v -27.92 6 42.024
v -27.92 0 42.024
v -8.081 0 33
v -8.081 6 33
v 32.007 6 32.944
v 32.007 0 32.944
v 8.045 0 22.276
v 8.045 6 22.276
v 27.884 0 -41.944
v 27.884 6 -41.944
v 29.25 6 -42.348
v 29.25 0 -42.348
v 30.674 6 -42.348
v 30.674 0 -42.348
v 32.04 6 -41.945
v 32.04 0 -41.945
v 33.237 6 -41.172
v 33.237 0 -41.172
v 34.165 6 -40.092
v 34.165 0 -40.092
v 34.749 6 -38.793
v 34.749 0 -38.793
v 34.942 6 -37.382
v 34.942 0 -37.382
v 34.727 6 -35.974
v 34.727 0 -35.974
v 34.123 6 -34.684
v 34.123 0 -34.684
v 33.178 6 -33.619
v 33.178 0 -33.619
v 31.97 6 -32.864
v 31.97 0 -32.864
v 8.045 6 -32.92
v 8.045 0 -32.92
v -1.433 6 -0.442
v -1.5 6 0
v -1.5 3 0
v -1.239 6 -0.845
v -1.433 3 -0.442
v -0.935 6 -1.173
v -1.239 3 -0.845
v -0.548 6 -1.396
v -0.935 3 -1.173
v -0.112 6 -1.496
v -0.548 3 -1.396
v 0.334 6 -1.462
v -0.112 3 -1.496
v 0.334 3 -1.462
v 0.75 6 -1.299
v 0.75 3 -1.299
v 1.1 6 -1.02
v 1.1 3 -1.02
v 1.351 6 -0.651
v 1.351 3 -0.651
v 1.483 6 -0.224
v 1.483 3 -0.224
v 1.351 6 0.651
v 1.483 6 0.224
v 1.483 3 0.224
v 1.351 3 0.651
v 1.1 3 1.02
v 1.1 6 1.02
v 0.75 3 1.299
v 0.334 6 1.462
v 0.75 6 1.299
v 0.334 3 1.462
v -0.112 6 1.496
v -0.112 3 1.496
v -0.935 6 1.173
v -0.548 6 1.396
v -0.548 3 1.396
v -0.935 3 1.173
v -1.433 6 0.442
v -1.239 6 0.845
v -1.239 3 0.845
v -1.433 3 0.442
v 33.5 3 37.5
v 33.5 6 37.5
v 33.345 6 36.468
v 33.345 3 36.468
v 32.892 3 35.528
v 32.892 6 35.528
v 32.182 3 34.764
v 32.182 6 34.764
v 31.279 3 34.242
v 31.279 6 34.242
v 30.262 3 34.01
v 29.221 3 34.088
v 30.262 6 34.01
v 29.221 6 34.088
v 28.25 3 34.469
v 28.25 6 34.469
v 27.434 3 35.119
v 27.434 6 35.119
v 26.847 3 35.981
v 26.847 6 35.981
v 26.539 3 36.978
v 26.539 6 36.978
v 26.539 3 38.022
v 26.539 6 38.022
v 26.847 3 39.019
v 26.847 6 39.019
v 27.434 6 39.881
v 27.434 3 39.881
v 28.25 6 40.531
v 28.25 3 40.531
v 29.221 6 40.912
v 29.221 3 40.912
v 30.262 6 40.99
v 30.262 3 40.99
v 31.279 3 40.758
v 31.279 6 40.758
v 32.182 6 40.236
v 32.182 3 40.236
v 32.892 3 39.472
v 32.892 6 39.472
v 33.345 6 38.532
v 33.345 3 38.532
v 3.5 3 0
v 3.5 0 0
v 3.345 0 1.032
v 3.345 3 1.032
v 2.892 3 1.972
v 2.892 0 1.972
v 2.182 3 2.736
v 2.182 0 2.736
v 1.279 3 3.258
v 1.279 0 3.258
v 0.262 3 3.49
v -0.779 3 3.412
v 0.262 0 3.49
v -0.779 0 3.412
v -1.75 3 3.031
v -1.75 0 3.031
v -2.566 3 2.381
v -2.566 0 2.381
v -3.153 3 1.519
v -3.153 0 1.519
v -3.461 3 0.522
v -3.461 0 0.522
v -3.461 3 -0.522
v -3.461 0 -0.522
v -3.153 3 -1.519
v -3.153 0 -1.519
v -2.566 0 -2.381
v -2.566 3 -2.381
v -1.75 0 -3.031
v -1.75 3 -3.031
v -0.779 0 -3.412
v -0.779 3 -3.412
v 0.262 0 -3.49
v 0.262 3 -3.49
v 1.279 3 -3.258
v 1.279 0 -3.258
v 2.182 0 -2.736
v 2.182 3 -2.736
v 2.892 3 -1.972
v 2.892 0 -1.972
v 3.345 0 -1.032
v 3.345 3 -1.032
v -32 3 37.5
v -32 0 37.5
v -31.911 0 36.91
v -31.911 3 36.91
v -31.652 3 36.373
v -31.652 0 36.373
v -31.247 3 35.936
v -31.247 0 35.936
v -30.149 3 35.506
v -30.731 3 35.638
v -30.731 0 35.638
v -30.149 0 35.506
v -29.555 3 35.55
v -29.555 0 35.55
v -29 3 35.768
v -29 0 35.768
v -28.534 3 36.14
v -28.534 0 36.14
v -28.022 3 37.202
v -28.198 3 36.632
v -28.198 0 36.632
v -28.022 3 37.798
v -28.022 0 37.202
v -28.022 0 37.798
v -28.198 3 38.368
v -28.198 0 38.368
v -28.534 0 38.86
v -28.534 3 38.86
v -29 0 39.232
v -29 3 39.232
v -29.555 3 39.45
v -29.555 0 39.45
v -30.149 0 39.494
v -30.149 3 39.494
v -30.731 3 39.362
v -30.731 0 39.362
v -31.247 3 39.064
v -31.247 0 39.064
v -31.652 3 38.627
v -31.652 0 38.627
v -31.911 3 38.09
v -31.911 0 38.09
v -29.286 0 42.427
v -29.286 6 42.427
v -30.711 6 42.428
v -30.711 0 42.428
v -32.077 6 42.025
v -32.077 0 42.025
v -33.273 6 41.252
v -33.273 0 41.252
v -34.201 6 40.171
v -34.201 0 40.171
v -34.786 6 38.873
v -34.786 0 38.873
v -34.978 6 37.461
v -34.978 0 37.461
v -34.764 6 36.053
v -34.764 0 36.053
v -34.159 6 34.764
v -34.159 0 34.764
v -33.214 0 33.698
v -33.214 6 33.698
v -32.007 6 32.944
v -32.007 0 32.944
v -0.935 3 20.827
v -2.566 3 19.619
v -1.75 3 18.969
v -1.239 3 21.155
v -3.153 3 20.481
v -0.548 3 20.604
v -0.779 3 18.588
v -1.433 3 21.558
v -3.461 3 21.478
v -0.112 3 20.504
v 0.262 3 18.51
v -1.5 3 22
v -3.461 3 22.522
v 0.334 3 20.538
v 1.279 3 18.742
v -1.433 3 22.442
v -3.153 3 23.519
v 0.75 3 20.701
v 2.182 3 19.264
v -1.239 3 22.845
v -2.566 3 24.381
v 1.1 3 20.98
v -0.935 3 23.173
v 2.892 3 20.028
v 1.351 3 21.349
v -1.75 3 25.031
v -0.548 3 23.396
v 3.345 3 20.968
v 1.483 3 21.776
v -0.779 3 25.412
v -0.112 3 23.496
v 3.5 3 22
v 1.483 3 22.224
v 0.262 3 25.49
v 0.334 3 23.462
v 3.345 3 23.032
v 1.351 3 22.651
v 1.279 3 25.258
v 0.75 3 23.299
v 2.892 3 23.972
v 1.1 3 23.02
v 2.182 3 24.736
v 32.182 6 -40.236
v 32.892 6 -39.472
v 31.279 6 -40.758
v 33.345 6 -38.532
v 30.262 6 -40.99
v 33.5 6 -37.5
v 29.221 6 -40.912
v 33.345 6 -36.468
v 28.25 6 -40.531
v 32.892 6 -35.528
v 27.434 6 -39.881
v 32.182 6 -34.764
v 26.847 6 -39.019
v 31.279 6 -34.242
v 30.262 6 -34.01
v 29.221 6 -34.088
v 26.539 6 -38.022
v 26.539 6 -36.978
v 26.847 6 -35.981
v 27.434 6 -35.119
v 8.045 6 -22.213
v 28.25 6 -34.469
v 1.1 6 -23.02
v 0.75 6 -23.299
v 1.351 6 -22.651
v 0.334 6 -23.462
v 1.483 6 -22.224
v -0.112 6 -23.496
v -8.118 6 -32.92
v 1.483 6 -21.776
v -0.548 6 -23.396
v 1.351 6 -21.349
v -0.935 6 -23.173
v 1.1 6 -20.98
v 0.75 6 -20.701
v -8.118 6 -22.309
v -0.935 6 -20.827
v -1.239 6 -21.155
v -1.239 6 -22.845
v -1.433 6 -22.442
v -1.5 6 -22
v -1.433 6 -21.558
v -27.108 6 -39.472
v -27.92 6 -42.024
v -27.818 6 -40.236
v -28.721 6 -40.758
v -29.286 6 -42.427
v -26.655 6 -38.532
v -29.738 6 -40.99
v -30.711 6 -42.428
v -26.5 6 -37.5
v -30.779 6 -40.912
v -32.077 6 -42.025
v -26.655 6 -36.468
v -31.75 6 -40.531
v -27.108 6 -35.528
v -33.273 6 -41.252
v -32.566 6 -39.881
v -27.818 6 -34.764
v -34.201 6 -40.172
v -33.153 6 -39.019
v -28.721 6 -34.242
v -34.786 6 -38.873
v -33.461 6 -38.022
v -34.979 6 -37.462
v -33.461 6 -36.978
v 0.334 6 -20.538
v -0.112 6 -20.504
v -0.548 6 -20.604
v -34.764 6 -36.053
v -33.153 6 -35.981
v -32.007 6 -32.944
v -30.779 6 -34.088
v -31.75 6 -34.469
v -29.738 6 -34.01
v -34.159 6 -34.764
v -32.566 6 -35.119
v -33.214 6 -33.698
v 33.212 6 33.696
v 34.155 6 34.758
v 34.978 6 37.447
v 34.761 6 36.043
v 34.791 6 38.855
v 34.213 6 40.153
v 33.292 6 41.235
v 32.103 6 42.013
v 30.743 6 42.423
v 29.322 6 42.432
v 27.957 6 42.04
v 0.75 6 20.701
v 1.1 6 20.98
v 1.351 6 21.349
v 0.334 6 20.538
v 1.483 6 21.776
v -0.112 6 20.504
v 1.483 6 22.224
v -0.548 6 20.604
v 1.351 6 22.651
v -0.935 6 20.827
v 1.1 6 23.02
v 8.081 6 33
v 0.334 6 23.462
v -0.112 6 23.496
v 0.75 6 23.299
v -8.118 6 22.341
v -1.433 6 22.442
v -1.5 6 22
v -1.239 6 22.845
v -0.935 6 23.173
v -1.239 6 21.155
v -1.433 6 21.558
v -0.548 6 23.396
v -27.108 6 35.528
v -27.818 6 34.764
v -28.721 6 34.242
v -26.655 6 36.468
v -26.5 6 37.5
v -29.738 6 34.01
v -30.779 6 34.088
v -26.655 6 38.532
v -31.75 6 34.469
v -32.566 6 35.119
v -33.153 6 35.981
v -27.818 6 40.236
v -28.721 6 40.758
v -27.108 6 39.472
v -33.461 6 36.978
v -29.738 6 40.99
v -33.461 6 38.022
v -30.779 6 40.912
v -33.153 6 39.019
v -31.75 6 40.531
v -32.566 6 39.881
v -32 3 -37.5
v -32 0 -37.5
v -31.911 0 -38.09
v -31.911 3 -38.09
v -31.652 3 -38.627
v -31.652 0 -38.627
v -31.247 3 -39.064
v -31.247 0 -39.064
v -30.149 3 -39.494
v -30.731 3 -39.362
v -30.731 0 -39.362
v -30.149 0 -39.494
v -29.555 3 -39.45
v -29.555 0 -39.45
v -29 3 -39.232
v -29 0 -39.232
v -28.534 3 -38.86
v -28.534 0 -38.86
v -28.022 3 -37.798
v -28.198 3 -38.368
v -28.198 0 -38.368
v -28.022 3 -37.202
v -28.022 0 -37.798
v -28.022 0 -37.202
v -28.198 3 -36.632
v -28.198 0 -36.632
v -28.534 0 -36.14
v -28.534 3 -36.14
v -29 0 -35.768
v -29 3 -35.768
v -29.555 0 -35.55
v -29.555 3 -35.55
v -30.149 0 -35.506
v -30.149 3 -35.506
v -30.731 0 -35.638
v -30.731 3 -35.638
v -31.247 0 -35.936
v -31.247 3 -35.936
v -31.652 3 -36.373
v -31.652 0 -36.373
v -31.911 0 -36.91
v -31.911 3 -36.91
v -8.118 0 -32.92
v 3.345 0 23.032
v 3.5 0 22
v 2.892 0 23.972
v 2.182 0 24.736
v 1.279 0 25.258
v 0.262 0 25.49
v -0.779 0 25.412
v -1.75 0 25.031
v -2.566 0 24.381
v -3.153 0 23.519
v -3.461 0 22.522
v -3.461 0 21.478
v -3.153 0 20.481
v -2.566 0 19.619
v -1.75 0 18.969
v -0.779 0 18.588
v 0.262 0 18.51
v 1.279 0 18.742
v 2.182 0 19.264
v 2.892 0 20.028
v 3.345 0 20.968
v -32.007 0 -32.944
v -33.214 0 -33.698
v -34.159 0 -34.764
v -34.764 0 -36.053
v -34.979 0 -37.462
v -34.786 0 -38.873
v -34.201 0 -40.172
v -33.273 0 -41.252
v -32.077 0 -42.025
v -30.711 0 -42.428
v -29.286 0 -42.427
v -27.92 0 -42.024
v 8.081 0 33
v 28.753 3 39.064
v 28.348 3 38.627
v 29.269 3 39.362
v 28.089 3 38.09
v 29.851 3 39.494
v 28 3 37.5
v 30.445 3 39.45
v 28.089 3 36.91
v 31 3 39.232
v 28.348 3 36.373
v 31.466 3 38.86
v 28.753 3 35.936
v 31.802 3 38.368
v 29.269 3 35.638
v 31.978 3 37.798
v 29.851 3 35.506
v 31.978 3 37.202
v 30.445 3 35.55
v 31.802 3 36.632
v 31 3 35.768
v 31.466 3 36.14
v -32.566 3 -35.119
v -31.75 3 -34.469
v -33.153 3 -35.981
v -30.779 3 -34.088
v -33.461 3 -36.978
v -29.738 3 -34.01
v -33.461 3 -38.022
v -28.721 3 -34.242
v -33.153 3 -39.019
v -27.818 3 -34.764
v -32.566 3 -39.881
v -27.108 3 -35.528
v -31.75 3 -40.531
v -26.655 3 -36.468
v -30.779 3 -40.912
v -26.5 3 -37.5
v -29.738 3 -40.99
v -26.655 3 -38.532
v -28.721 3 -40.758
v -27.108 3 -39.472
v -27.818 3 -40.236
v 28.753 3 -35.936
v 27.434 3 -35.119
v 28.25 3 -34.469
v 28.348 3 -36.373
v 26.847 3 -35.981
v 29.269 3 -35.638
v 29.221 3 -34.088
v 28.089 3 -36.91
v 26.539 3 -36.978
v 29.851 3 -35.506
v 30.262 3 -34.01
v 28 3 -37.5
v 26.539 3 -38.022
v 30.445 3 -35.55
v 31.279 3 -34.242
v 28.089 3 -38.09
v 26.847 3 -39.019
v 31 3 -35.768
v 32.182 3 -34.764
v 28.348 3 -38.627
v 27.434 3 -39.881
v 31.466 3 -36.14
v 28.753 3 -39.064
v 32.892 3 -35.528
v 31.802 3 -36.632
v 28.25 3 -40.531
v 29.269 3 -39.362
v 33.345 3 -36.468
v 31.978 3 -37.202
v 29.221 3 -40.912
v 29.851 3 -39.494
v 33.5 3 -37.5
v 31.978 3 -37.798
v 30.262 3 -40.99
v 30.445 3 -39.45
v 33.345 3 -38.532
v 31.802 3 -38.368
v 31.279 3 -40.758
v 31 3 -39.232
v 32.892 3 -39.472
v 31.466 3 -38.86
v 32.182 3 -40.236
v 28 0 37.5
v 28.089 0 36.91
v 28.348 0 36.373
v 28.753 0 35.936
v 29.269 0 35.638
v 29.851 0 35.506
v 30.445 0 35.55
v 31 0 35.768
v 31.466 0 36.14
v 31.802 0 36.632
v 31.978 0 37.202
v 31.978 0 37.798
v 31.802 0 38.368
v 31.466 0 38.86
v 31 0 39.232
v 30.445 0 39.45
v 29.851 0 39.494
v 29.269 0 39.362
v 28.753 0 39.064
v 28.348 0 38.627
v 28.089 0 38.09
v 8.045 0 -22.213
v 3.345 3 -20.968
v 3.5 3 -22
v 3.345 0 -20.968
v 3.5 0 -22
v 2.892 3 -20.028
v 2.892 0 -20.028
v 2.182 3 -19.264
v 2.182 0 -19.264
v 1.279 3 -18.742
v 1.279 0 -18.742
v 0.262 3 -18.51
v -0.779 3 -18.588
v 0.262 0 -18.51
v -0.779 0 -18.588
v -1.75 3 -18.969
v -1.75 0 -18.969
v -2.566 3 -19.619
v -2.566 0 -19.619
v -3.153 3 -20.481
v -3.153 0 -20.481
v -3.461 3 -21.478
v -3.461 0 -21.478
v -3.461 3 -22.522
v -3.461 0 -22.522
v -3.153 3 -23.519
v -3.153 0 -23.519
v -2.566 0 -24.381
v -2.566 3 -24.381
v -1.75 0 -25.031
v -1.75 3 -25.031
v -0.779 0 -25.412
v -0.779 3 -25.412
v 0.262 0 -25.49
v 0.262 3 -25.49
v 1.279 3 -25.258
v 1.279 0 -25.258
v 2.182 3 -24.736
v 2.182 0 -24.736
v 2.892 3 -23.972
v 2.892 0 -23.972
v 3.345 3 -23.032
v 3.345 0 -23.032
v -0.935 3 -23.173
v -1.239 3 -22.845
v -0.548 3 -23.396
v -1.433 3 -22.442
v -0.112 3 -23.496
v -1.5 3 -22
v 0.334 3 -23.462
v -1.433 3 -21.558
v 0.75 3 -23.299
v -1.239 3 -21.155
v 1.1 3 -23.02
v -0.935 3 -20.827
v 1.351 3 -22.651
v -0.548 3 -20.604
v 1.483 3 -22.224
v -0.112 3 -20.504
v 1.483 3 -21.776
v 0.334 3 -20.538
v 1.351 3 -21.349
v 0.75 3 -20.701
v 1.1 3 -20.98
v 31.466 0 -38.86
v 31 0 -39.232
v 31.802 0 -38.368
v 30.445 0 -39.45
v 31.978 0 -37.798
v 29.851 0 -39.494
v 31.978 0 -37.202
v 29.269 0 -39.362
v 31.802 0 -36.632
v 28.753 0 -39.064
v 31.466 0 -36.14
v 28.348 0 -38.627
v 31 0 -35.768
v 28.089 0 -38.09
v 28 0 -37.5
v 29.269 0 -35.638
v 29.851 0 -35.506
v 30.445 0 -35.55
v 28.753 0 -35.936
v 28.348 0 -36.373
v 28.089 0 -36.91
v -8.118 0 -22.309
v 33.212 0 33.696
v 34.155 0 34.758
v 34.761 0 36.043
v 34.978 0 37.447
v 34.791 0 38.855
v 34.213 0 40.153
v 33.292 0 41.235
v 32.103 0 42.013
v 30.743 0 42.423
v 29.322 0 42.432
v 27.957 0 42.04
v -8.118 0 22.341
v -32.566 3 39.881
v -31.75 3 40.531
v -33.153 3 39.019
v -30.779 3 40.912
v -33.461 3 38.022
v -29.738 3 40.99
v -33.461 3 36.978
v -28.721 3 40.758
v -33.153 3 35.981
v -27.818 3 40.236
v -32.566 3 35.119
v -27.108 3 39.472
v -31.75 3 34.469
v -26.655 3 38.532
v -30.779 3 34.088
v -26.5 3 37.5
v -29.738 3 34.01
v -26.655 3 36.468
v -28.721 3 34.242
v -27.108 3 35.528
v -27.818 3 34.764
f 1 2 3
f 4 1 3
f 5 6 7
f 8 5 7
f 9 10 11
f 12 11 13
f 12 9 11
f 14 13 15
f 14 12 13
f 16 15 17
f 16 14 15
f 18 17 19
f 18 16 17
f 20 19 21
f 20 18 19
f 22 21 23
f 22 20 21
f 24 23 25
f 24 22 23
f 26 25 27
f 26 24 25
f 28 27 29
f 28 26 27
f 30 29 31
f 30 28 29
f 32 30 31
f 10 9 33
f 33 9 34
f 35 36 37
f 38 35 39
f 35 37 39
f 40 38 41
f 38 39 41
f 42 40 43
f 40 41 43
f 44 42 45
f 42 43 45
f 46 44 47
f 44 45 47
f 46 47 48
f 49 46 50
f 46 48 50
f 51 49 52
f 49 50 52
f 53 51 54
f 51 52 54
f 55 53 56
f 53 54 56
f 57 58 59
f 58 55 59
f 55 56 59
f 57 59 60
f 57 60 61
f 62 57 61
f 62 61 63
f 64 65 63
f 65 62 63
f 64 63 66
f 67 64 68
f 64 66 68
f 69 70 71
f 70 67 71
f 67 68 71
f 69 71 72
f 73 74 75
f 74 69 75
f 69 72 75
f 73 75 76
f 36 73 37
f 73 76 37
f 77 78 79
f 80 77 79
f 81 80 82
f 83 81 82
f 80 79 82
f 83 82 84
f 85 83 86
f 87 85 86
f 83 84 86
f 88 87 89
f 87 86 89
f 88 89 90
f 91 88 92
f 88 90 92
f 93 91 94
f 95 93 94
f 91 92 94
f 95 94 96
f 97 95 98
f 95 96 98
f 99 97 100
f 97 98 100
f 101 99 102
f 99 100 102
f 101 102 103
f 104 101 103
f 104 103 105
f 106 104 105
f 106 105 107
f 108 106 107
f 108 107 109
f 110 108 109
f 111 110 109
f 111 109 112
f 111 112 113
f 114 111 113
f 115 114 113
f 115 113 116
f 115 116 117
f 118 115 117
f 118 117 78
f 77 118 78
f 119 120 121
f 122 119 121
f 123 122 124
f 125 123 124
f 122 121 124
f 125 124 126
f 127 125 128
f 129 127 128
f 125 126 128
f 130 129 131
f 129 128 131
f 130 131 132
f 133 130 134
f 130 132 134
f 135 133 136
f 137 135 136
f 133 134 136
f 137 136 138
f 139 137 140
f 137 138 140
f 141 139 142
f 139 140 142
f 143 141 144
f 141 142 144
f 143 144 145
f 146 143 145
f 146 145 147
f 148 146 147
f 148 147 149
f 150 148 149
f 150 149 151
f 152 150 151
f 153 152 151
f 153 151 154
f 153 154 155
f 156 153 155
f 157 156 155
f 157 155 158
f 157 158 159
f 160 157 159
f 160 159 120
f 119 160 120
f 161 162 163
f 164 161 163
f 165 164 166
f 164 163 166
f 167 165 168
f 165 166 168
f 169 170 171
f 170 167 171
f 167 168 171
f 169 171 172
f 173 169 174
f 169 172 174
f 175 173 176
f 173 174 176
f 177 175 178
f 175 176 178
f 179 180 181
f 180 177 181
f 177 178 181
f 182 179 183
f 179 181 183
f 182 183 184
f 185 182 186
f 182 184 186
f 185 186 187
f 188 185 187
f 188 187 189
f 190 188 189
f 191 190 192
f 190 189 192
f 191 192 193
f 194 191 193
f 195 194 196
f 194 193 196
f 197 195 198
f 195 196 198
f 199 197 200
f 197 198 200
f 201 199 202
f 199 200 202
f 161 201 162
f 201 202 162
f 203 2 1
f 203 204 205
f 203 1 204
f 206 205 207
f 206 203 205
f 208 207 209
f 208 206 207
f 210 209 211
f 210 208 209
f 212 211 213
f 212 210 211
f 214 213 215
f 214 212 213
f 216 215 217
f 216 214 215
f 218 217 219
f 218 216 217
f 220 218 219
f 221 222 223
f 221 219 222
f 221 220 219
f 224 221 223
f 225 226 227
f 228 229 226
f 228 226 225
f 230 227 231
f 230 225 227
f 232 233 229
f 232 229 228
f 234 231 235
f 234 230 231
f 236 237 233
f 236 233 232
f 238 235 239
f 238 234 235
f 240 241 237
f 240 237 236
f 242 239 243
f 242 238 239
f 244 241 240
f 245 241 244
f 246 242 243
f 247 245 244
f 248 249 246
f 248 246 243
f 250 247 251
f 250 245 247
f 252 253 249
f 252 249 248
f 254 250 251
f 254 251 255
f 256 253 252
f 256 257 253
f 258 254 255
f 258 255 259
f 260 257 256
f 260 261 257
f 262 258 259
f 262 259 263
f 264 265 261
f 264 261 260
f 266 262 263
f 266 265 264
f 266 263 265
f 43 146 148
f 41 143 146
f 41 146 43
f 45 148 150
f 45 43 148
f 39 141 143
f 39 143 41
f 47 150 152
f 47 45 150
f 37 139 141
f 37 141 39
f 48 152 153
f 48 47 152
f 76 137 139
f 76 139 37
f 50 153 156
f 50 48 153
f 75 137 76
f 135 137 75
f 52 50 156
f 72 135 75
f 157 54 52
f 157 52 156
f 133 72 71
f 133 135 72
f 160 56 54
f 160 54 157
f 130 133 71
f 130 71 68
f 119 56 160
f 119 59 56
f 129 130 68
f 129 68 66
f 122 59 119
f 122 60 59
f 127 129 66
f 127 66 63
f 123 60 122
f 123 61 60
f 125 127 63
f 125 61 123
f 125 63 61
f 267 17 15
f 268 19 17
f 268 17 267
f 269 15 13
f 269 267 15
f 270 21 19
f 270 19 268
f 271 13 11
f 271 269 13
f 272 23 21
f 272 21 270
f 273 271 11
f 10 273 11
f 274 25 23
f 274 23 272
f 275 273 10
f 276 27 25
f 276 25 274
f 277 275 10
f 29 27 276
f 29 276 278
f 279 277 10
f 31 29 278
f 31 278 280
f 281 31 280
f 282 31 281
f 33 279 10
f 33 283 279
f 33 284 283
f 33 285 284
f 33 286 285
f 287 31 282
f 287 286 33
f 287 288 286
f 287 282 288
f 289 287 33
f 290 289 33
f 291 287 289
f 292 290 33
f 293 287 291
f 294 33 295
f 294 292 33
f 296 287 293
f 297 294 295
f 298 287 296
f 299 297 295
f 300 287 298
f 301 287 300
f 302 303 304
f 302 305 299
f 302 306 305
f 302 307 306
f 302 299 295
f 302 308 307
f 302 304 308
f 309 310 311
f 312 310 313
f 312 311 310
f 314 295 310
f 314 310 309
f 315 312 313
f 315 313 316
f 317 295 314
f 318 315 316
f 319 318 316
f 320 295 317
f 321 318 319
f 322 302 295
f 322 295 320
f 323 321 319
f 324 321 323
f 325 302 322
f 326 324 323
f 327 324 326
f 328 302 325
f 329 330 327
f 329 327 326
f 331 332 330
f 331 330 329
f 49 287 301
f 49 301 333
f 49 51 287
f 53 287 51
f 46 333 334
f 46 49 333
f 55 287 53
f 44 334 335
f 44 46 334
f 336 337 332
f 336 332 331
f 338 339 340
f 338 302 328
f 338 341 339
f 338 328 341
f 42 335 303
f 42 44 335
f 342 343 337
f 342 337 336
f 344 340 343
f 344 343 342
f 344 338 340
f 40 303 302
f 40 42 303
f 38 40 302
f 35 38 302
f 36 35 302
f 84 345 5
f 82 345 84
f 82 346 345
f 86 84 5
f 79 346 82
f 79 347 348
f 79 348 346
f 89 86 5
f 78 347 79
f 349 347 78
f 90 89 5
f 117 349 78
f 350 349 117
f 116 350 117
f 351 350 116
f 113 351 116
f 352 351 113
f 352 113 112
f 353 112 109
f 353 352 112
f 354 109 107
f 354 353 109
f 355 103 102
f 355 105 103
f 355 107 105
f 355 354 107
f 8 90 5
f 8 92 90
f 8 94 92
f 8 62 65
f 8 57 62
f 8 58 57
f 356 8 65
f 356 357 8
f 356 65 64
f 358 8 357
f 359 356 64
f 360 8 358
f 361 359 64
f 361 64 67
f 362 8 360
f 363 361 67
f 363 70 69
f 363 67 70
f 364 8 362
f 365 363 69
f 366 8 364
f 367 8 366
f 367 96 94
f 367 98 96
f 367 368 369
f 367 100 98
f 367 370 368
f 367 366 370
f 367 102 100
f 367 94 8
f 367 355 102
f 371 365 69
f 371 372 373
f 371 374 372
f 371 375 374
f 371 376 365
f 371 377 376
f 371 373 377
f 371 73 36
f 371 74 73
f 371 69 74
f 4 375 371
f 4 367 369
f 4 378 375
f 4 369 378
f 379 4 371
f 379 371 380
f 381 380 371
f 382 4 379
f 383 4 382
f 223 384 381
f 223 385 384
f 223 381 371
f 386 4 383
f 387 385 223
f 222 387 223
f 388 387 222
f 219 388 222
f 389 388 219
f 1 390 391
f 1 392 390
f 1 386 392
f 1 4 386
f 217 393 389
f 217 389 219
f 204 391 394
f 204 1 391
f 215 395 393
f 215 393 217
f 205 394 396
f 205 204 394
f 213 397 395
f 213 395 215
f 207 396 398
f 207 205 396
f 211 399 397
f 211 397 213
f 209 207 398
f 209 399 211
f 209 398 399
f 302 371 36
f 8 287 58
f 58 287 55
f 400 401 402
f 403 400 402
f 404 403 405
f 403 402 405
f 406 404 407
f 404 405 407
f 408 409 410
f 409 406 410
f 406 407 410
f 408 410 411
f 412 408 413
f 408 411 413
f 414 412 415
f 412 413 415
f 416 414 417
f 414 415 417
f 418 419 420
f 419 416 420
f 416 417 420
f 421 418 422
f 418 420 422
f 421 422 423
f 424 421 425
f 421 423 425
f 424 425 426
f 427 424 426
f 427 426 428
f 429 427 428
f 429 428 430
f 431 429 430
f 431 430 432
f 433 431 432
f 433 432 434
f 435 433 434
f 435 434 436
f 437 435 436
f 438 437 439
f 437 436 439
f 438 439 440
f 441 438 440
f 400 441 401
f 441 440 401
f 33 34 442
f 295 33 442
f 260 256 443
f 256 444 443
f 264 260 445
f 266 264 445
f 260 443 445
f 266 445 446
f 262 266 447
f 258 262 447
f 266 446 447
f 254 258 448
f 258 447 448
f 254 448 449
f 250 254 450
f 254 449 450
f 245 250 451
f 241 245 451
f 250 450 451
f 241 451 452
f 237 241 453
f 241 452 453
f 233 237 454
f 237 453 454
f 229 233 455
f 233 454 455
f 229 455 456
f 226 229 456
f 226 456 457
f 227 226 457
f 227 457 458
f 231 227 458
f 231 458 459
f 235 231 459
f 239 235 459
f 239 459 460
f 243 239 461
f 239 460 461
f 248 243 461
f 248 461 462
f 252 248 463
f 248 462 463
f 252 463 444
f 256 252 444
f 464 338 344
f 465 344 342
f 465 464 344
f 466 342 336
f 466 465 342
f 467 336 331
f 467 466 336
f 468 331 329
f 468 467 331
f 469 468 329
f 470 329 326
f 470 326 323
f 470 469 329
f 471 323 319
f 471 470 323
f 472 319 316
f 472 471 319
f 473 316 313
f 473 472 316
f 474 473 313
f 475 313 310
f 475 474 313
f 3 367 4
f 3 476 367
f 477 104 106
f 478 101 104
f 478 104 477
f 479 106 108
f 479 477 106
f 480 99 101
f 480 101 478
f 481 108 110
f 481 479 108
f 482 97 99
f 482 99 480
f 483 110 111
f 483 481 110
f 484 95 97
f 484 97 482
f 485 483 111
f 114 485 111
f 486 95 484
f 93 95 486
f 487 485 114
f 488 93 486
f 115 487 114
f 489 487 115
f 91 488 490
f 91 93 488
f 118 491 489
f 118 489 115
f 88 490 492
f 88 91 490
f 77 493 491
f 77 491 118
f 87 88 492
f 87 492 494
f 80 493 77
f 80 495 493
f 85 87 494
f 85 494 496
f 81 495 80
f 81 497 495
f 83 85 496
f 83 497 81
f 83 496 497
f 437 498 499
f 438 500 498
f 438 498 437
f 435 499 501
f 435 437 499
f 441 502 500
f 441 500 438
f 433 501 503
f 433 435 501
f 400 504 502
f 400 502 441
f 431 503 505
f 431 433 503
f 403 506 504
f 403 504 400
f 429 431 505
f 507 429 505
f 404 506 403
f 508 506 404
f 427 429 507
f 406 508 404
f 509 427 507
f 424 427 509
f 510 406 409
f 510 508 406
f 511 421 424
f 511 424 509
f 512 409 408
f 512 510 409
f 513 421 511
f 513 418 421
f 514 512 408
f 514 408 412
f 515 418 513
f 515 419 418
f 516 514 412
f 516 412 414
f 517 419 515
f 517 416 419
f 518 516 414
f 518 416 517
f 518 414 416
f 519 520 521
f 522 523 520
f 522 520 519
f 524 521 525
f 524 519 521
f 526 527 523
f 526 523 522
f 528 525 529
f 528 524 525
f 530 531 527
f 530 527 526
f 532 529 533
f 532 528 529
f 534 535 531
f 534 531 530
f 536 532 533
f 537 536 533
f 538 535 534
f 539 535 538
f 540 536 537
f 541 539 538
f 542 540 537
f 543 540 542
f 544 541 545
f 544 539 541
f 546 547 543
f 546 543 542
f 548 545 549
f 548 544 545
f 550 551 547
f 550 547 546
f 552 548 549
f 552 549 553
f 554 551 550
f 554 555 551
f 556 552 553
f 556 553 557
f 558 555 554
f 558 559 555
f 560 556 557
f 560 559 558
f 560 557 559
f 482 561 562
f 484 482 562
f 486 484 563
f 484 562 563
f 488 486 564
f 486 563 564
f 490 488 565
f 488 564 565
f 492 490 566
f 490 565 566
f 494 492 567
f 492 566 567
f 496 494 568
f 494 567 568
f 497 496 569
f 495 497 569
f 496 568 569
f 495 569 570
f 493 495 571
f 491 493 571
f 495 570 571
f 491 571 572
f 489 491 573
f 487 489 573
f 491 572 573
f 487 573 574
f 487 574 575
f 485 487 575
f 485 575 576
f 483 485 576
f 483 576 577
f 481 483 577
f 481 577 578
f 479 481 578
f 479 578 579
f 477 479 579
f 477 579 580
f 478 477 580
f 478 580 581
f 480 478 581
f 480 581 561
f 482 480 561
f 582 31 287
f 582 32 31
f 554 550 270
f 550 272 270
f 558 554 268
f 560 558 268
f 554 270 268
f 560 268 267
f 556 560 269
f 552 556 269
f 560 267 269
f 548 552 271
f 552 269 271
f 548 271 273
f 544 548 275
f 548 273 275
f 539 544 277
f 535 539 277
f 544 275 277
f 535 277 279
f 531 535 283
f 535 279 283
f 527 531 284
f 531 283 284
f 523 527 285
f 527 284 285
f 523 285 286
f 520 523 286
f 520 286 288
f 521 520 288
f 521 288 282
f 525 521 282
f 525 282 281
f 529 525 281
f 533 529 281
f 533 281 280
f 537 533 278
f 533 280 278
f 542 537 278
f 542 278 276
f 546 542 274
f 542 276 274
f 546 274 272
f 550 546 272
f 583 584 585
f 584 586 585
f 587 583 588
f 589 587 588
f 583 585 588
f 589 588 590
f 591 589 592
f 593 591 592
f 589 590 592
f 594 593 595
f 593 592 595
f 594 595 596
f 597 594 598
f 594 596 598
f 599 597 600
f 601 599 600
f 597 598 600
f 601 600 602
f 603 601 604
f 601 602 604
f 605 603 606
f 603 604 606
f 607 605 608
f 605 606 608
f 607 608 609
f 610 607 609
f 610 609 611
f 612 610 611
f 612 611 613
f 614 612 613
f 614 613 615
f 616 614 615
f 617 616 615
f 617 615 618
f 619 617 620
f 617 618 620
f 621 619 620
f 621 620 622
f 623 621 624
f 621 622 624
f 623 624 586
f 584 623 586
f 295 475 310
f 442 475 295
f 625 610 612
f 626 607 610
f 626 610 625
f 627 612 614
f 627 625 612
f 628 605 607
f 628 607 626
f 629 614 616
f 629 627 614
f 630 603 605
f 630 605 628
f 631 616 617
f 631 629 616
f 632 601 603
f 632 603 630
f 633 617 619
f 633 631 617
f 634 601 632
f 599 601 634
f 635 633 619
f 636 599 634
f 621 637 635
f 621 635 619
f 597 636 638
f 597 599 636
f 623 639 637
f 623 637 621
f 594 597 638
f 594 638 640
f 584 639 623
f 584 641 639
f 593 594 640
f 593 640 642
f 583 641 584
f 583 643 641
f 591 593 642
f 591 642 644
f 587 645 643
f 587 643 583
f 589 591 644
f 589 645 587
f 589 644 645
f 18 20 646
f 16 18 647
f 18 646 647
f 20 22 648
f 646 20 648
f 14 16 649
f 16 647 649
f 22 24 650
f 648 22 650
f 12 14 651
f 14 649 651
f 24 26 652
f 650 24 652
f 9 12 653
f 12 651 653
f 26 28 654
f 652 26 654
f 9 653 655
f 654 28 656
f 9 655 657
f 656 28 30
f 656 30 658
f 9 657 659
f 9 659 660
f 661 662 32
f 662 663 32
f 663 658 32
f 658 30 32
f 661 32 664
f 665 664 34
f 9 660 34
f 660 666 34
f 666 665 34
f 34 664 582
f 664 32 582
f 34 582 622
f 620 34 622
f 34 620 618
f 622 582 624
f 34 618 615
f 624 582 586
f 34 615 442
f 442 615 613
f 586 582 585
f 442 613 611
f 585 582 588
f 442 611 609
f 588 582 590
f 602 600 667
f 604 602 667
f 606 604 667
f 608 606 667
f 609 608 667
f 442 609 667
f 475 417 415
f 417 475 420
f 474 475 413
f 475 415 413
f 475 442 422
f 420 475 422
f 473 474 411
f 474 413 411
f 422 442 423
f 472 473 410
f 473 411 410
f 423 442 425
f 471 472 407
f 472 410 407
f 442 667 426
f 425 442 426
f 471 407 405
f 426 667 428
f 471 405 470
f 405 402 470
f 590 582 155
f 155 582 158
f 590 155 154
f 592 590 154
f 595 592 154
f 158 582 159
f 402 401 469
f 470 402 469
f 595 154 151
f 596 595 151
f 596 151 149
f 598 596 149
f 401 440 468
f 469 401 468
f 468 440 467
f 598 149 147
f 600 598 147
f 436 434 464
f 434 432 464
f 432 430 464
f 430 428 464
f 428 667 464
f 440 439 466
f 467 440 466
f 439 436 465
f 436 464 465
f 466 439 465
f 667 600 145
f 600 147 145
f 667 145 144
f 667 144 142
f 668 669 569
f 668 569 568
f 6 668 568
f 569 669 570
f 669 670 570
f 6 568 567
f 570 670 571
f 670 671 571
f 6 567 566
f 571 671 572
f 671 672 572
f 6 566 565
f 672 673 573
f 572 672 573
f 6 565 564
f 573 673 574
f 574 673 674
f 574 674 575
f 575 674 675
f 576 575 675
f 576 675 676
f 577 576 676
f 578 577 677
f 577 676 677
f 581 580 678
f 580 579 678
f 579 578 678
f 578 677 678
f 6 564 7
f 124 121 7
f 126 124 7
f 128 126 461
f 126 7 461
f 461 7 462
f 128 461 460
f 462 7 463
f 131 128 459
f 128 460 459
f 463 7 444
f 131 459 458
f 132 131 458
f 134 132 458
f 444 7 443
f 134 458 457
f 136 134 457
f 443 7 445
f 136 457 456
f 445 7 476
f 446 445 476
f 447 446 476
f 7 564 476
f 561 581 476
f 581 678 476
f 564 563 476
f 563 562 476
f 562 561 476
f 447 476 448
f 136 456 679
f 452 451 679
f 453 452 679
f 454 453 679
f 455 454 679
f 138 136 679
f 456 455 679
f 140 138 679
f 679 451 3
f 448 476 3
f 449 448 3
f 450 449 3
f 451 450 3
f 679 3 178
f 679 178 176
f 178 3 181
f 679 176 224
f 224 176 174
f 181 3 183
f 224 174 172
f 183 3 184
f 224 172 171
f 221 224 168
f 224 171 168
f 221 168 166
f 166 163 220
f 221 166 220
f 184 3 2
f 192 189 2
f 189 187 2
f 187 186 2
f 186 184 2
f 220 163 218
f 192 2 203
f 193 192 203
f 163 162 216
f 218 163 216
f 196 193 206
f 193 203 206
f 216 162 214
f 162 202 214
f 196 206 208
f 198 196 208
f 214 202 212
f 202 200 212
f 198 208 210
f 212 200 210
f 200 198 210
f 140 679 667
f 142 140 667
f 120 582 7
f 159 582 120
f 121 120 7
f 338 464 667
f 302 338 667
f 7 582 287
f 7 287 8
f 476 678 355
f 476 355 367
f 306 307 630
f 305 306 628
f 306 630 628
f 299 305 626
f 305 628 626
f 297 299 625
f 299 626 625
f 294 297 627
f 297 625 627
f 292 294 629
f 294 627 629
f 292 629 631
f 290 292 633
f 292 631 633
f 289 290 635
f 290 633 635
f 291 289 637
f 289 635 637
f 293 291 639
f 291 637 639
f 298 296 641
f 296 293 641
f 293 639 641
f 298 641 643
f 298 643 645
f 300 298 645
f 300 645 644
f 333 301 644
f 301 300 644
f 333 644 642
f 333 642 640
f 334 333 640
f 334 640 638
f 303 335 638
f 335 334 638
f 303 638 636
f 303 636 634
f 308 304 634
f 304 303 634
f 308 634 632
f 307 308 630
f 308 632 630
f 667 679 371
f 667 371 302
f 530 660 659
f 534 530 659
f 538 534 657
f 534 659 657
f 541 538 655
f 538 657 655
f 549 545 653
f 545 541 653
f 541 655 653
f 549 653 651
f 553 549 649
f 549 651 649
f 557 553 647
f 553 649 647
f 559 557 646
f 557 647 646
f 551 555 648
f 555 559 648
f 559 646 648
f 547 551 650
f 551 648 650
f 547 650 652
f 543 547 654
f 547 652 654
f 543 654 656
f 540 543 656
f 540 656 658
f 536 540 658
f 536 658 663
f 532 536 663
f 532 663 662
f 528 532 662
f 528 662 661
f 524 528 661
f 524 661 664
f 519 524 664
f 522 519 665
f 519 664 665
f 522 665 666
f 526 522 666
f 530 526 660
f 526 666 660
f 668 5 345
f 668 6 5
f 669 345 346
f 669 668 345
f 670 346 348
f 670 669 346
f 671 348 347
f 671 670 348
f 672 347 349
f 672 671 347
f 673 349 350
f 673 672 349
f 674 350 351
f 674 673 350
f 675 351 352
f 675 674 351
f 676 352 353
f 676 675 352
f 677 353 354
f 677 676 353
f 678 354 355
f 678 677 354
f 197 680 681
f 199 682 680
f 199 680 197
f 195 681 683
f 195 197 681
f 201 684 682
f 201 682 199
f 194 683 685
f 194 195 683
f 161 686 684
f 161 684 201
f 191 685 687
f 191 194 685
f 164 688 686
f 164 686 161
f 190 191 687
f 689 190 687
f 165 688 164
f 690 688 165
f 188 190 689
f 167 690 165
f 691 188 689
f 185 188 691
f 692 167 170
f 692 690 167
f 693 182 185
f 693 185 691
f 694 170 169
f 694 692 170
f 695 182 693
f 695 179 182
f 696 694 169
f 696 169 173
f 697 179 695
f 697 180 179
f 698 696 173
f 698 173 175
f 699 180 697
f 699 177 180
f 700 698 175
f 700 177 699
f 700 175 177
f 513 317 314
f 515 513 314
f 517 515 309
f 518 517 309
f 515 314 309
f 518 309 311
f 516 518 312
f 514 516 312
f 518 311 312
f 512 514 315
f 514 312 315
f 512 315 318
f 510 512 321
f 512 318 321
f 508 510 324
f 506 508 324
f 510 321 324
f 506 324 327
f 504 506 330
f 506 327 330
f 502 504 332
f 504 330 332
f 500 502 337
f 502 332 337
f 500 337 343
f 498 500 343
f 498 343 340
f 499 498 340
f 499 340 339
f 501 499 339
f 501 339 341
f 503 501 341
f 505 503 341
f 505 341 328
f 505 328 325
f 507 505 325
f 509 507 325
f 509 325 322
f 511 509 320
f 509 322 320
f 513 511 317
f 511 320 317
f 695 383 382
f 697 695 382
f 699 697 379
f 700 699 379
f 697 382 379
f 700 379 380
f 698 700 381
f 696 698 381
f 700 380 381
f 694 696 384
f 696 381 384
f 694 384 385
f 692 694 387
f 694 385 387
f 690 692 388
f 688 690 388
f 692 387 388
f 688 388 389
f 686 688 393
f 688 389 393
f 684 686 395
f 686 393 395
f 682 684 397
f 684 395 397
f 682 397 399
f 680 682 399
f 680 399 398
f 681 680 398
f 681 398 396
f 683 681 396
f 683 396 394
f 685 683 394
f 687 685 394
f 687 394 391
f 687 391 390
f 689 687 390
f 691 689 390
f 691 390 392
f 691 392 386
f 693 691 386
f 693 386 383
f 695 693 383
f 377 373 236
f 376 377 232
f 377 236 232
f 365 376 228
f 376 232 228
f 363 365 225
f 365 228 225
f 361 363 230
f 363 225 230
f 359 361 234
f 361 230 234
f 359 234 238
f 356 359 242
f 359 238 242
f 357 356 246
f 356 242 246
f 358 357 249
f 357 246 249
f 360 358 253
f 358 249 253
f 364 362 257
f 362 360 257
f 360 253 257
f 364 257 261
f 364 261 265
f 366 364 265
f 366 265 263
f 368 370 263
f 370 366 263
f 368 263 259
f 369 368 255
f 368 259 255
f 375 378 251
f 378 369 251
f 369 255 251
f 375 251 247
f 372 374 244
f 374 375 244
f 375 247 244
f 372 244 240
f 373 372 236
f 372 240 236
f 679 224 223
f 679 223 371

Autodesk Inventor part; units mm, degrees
ref_plane "YZ Plane" through (0, 0, 0) normal (1, 0, 0) x (0, 1, 0)
ref_plane "XZ Plane" through (0, 0, 0) normal (0, 1, 0) x (-1, 0, 0)
ref_plane "XY Plane" through (0, 0, 0) normal (0, 0, 1) x (1, 0, 0)
sketch "Sketch1" plane through (0, 0, 0) normal (0, 1, 0) x (-1, 0, 0)
  circle A0 centre (30, -37.5) radius 2
  circle A1 centre (-30, -37.5) radius 2
  circle A2 centre (-30, 37.5) radius 2
  circle A3 centre (30, 37.5) radius 2
  arc A4 (27.9205, -42.0236) -> (32.0065, -32.9436) centre (30, -37.5) ccw
  line L0 (-8.045, -32.9204) -> (0.0364, -32.9204)
  line L1 (-8.045, -32.9204) -> (8.1178, -32.9204)
  line L2 (-8.0814, 33) -> (8.0814, 33)
  line L3 (27.9205, -42.0236) -> (8.1178, -32.9204)
  line L4 (32.0431, -32.9598) -> (8.1178, -22.3088)
  circle A5 centre (-30, -37.5) radius 2
  arc A6 (-31.9701, -32.864) -> (-27.8841, -41.944) centre (-29.9636, -37.4204) ccw
  line L5 (-27.9205, -41.9606) -> (-8.045, -32.9204)
  line L6 (-32.0067, -32.8802) -> (-8.045, -22.213)
  circle A7 centre (30, 37.5) radius 2
  circle A8 centre (-30, 37.5) radius 2
  arc A9 (32.0065, 32.9436) -> (27.9205, 42.0236) centre (30, 37.5) ccw
  line L7 (-8.0814, 33) -> (0, 33)
  line L8 (-8.0814, 33) -> (8.0814, 33)
  line L9 (27.9569, 42.0402) -> (8.0814, 33)
  line L10 (32.0278, 32.953) -> (8.1178, 22.341)
  line L11 (-27.9569, 42.0402) -> (-8.0814, 33)
  circle A10 centre (-30, 37.5) radius 2
  arc A11 (-27.9205, 42.0236) -> (-32.0065, 32.9436) centre (-30, 37.5) ccw
  line L12 (-32.0431, 32.9598) -> (-8.045, 22.2764)
  circle A12 centre (0, -22) radius 1.5
  circle A13 centre (0, 0) radius 1.5
  circle A14 centre (0, 22) radius 1.5
  line L13 (8.1178, 22.341) -> (8.1178, -22.3088)
  line L14 (-8.045, -22.213) -> (-8.045, 22.2764)
extrude "Extrusion1" add sketch "Sketch1" along normal blind 6
sketch "Sketch2" plane through (0, 6, 0) normal (0, 1, 0) x (1, 0, 0)
  circle A0 centre (-30, 37.5) radius 2 projected
  circle A1 centre (-30, 37.5) radius 3.5
  circle A2 centre (30, 37.5) radius 2 projected
  circle A3 centre (30, 37.5) radius 3.5
  circle A4 centre (-30, -37.5) radius 2 projected
  circle A5 centre (-30, -37.5) radius 3.5
  circle A6 centre (30, -37.5) radius 2 projected
  circle A7 centre (30, -37.5) radius 3.5
  point P0 (0, 0)
  dimension "d7" = 7
  dimension "d8" = 7
  dimension "d9" = 7
  dimension "d10" = 7
extrude "Extrusion2" cut sketch "Sketch2" against normal blind 3 contours A1 | A3 | A5 | A6 | A7
sketch "Sketch3" plane through (0, 0, 0) normal (0, -1, 0) x (1, 0, 0)
  circle A0 centre (0, 0) radius 3.5
  circle A1 centre (0, -22) radius 1.5 projected
  circle A2 centre (0, -22) radius 3.5
  circle A3 centre (0, 22) radius 1.5 projected
  circle A4 centre (0, 22) radius 3.5
  dimension "d13" = 7
  dimension "d14" = 7
  dimension "d15" = 7
extrude "Extrusion3" cut sketch "Sketch3" against normal blind 3
properties part number "Battery Plate"
